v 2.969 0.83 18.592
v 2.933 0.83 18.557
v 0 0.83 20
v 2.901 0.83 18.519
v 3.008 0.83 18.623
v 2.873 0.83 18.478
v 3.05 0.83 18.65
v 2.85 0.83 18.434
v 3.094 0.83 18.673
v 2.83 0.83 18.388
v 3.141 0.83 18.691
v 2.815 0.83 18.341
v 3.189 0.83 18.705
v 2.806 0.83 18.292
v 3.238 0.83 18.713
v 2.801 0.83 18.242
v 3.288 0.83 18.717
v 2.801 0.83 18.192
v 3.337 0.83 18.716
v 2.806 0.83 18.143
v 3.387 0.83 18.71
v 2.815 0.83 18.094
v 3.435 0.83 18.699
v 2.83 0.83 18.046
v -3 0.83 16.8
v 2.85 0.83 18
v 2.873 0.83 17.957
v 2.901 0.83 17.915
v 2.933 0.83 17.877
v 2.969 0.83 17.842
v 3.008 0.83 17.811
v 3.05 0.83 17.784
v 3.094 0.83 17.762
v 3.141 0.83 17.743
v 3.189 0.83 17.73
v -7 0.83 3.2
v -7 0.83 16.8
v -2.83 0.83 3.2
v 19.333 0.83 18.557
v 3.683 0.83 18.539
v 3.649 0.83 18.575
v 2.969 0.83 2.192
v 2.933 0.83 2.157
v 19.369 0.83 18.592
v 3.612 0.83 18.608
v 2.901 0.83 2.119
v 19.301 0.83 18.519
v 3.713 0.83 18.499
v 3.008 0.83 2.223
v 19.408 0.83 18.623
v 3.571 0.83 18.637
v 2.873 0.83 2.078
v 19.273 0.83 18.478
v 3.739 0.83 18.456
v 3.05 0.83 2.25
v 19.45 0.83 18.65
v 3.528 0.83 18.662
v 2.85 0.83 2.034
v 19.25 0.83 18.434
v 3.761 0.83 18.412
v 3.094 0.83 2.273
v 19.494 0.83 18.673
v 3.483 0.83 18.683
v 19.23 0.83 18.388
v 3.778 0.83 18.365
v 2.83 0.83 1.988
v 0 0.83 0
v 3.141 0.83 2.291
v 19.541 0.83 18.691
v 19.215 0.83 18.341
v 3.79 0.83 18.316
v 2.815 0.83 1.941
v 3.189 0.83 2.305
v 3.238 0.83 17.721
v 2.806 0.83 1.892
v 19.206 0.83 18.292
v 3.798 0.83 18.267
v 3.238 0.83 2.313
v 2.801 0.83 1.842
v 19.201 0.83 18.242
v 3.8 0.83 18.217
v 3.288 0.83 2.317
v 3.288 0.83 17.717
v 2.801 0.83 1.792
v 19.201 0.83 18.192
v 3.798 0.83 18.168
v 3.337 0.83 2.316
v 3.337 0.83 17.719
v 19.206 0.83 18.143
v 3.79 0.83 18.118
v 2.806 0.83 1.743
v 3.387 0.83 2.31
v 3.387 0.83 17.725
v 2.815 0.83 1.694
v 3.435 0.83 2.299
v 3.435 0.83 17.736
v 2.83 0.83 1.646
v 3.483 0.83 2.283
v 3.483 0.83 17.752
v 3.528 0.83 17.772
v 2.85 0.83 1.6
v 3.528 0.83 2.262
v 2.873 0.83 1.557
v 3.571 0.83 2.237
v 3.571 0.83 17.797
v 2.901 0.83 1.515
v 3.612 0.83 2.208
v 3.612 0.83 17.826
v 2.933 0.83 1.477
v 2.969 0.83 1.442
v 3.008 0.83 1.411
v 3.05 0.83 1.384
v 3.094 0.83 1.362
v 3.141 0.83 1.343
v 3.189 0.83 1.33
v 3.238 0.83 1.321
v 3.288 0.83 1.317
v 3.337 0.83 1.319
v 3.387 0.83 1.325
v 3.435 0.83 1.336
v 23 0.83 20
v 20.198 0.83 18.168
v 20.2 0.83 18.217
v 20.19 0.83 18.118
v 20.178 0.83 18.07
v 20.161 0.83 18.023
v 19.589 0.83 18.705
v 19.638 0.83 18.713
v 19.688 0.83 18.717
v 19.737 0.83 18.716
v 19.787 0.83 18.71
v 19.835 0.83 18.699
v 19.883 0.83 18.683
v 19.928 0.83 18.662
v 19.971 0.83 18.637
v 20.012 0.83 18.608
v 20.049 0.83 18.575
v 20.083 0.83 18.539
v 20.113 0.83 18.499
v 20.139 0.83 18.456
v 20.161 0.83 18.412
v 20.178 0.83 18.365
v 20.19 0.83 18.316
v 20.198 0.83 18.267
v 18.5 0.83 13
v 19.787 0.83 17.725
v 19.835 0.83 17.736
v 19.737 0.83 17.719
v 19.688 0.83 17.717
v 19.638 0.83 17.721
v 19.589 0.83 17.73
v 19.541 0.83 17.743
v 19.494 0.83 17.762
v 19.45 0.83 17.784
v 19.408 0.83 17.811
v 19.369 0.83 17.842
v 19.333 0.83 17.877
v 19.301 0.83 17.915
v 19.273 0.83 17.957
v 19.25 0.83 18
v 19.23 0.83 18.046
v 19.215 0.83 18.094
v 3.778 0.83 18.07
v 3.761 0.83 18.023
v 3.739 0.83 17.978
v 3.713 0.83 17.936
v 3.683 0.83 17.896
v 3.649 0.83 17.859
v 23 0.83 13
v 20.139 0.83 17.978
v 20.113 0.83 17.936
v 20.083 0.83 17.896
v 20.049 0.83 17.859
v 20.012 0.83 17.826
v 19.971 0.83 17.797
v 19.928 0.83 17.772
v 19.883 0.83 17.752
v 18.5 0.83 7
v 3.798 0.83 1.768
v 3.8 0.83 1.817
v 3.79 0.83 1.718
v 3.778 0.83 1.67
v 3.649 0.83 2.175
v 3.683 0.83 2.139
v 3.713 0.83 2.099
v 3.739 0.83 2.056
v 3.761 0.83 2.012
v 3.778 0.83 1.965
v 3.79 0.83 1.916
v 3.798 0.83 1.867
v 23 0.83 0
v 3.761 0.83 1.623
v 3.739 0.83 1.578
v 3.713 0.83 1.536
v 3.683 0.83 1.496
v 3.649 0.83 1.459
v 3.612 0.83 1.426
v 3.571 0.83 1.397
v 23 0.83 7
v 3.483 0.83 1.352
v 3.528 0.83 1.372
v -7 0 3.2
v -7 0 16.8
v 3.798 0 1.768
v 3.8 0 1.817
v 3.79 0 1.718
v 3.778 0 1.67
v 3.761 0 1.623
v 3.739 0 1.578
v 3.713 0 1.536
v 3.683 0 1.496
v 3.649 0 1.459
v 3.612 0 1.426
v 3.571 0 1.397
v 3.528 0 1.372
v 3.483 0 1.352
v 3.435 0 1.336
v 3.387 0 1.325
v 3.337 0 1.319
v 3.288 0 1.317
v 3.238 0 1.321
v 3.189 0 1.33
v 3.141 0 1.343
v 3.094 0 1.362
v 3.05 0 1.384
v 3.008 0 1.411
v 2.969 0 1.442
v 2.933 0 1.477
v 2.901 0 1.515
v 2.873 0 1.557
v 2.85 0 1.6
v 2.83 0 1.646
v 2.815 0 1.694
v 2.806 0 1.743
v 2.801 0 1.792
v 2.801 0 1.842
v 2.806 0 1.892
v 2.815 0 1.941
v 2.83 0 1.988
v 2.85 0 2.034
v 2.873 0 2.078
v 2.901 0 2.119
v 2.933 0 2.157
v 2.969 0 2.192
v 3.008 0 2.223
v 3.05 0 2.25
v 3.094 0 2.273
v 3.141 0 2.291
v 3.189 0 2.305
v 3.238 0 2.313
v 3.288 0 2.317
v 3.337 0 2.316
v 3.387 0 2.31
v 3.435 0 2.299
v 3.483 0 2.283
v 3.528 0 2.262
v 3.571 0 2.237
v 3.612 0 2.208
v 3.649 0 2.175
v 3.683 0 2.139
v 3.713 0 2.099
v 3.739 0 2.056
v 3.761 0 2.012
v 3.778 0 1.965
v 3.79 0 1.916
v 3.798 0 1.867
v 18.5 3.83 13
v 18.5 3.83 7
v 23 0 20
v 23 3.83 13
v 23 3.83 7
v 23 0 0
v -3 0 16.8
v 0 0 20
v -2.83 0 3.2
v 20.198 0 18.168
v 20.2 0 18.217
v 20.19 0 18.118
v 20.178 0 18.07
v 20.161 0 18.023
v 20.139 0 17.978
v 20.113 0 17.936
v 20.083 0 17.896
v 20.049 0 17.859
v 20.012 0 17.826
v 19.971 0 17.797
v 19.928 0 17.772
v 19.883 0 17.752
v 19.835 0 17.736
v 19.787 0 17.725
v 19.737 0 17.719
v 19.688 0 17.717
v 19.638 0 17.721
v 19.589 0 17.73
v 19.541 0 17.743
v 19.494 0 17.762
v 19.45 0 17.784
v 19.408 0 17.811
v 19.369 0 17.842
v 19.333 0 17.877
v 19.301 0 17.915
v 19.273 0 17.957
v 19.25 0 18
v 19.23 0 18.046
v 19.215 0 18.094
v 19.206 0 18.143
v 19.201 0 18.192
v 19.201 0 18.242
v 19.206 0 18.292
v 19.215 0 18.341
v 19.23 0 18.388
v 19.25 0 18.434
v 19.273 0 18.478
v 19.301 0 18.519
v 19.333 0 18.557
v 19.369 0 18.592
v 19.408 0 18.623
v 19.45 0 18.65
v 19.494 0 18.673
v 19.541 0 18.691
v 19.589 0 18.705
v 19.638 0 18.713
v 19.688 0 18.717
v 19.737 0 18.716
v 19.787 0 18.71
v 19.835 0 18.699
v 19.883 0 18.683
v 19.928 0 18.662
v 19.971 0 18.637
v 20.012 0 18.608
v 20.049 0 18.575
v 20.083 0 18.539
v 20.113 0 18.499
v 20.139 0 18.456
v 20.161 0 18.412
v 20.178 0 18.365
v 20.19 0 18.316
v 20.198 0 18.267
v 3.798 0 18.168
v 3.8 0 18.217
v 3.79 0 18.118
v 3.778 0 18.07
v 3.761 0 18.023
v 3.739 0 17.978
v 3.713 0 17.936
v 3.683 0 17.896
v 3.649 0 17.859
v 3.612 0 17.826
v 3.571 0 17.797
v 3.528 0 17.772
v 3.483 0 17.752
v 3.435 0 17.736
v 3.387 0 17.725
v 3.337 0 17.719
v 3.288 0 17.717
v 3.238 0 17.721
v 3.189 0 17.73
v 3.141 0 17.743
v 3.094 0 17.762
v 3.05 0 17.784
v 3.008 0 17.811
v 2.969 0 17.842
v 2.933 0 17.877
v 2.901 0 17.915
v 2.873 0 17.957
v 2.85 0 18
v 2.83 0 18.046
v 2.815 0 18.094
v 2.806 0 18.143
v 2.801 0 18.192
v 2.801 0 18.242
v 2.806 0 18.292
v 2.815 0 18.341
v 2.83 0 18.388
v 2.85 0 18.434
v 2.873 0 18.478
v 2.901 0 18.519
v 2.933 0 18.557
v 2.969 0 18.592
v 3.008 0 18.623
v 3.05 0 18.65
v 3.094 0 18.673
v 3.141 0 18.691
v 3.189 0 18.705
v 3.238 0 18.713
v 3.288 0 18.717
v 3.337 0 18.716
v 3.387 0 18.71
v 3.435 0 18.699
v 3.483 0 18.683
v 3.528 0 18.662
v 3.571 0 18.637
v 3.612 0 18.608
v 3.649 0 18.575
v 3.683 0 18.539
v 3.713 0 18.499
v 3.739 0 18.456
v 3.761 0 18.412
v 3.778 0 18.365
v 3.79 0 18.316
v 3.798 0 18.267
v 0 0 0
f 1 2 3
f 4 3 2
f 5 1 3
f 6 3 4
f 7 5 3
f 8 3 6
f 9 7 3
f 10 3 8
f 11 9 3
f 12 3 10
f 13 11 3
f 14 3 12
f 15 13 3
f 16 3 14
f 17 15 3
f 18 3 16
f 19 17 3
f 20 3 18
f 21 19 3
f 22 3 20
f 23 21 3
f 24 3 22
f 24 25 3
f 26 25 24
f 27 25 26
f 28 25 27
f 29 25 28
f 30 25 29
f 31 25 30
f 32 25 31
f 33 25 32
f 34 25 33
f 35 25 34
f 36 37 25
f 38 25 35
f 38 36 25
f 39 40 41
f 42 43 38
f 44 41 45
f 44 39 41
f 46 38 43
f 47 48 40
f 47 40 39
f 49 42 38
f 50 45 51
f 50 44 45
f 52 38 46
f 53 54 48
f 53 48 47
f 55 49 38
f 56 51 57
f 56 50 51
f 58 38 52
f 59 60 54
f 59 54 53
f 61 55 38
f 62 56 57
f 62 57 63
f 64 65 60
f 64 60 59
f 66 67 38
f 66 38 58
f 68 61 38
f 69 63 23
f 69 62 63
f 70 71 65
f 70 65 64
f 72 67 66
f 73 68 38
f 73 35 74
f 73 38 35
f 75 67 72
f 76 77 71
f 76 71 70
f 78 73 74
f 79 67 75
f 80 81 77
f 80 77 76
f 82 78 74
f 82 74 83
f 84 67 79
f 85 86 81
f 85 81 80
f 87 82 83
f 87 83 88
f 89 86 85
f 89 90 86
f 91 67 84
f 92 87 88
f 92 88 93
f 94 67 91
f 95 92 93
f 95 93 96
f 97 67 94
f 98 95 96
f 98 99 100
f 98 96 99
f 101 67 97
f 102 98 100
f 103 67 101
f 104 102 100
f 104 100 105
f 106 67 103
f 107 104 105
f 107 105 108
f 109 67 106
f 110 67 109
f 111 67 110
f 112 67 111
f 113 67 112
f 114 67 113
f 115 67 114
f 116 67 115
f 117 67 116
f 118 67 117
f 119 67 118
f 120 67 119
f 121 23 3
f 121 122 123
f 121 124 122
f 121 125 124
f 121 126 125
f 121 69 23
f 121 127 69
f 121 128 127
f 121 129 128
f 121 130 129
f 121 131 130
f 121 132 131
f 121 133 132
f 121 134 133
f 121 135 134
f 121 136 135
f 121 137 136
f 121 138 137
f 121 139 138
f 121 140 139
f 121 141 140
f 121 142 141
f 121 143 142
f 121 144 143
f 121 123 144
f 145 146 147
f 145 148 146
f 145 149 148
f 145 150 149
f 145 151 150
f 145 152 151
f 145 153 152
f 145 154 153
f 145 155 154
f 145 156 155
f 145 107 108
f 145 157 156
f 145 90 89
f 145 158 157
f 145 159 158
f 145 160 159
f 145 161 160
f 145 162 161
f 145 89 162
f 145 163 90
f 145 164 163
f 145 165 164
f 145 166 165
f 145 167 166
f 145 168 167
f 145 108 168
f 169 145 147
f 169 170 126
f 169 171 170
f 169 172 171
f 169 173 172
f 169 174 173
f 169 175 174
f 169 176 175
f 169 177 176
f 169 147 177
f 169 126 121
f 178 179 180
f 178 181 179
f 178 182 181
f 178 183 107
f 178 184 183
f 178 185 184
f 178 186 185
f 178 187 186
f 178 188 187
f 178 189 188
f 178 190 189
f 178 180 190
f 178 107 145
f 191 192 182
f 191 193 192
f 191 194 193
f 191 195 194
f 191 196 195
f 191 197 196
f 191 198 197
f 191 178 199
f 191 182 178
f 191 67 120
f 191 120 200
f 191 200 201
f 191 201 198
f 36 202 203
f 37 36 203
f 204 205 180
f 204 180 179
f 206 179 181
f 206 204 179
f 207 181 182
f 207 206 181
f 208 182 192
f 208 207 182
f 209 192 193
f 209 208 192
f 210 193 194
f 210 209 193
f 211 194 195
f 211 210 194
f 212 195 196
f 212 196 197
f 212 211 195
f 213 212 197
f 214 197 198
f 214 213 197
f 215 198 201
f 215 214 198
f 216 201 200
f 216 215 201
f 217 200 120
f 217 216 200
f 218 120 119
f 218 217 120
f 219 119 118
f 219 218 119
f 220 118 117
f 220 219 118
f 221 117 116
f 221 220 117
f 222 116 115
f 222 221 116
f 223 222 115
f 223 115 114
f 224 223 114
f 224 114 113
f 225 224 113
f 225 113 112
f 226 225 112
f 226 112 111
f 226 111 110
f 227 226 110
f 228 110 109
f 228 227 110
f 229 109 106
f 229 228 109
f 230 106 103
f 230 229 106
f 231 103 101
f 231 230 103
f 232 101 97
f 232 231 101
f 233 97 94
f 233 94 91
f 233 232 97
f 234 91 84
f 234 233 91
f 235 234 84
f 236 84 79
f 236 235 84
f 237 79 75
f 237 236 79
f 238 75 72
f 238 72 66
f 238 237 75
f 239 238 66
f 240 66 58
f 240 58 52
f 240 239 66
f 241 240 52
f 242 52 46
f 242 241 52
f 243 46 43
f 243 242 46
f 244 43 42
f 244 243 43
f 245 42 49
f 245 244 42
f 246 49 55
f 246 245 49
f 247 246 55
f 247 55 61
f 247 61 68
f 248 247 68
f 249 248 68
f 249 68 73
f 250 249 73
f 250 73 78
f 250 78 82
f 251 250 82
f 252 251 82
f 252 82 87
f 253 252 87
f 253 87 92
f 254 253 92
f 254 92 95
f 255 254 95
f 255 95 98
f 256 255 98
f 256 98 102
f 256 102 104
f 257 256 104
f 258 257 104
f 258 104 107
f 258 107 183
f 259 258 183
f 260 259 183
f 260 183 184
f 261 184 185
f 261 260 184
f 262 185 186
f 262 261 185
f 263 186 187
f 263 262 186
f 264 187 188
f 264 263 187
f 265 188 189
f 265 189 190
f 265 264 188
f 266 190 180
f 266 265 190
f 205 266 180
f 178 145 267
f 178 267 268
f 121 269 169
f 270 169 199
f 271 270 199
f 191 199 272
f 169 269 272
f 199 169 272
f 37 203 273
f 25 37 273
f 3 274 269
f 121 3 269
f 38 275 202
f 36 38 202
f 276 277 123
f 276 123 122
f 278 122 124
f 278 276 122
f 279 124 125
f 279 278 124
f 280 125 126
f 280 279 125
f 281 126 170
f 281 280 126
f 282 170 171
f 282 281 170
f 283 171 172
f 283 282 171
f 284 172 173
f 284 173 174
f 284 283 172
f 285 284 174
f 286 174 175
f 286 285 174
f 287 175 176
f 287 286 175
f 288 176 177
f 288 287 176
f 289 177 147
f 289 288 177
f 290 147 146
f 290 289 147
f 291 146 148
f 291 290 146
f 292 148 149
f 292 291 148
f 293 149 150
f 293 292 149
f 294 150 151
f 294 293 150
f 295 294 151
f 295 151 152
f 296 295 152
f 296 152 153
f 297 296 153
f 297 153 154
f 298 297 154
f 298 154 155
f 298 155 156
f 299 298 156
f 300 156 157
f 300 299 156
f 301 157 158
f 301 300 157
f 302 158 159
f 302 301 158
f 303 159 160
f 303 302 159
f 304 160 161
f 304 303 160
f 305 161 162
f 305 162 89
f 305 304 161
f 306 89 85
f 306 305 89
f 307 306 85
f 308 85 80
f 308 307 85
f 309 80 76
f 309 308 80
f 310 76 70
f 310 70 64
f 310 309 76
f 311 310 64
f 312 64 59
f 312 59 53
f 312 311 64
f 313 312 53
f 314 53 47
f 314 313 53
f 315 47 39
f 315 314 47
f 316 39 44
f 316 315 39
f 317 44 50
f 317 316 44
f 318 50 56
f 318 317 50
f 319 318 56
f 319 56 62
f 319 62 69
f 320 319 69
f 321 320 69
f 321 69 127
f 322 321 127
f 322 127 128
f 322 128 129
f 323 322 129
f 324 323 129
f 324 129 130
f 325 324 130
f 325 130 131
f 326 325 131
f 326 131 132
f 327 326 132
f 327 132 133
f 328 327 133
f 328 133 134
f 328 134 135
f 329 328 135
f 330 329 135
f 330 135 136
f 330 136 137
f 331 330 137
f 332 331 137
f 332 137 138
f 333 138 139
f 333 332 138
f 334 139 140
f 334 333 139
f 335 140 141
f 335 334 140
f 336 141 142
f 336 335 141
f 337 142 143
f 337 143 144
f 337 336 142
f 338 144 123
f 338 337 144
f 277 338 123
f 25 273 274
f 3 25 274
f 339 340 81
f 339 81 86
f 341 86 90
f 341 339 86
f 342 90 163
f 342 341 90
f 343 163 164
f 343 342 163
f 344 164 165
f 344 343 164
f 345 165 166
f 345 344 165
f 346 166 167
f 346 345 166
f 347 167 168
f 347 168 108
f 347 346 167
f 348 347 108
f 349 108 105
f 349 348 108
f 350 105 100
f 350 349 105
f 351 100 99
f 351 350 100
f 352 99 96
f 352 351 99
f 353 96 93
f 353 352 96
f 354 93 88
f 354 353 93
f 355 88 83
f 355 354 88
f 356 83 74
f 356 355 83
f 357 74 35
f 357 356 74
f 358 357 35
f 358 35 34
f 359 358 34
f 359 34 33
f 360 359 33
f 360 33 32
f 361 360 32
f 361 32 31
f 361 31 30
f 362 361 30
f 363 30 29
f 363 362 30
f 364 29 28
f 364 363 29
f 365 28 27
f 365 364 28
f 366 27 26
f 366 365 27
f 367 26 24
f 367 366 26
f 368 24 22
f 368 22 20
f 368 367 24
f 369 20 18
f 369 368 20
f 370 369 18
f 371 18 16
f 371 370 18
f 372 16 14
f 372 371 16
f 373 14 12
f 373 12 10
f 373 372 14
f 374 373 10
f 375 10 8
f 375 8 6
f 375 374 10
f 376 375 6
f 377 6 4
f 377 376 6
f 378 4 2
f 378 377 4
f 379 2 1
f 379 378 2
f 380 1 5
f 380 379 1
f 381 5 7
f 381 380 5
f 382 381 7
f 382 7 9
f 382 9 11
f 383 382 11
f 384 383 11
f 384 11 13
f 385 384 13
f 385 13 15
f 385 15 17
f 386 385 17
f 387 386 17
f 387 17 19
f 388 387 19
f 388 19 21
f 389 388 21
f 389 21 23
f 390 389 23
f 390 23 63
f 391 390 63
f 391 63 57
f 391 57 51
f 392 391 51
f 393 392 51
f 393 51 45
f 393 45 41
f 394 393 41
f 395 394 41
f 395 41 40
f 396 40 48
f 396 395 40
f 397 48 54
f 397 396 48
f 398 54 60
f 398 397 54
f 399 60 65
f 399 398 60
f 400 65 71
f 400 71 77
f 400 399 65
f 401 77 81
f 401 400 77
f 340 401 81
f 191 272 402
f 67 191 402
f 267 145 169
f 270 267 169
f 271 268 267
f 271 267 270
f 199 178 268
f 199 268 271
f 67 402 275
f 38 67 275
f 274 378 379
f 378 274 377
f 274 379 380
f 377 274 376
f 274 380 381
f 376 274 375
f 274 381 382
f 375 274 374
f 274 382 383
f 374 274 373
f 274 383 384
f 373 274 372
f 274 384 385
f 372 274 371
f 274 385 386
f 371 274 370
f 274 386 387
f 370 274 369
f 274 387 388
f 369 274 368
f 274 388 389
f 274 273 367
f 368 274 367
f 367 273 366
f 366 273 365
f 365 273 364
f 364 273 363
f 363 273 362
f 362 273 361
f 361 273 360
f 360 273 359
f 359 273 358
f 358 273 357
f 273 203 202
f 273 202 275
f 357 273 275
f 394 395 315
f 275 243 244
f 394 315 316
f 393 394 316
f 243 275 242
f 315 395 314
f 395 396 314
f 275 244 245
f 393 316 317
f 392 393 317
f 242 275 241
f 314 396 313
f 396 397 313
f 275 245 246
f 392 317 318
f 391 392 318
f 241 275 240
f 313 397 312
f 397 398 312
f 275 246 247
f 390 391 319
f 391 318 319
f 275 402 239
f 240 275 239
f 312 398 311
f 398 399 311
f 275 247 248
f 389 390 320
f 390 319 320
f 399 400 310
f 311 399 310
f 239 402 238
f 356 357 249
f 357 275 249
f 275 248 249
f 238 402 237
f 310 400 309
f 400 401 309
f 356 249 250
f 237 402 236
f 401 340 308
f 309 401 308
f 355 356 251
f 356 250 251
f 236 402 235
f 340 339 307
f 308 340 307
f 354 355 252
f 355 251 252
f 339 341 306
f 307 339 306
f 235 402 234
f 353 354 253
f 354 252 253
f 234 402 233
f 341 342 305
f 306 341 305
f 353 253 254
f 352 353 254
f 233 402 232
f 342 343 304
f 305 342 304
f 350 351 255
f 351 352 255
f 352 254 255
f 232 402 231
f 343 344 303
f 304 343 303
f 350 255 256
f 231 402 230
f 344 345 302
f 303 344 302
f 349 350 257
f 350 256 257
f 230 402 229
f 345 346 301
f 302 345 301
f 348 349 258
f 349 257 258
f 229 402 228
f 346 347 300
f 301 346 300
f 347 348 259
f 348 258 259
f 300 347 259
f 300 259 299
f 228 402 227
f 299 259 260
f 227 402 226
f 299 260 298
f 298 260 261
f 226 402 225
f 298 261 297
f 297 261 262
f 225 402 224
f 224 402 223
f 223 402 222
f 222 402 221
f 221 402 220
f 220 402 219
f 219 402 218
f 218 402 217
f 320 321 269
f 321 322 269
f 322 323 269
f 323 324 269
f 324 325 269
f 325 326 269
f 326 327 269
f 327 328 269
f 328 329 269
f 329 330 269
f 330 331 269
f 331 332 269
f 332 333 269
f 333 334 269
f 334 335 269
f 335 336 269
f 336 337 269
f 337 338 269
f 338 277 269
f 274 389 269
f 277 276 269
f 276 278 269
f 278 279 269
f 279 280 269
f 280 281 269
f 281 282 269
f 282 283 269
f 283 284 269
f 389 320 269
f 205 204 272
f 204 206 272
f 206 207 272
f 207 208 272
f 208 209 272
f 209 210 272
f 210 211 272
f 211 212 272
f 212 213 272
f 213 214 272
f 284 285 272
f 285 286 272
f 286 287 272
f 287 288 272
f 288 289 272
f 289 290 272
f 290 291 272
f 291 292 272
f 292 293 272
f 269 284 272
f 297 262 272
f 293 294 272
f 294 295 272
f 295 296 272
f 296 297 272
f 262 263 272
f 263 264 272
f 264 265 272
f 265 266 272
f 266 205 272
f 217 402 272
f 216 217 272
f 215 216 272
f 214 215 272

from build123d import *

# Parameters (mm, degrees)
SKETCH1_R           = 0.5
BOSS_EXTRUDE1_DEPTH = 0.83
SKETCH2_W           = 4.5
SKETCH2_H           = 6
BOSS_EXTRUDE2_DEPTH = 3


with BuildPart() as part:
    # Sketch1 → Boss-Extrude1 (new body)
    with BuildSketch(Plane(origin=(0, 0, 0), x_dir=(1, 0, 0), z_dir=(0, 1, 0))):
        Polygon((0, 0), (-2.83, -3.2), (-7, -3.2), (-7, -16.8), (-3, -16.8), (0, -20), (23, -20), (23, 0), align=None)
        with Locations((3.3, -18.217292277)):
            Circle(SKETCH1_R, mode=Mode.SUBTRACT)
        with Locations((3.3, -1.817292277)):
            Circle(SKETCH1_R, mode=Mode.SUBTRACT)
        with Locations((19.7, -18.217292277)):
            Circle(SKETCH1_R, mode=Mode.SUBTRACT)
    extrude(amount=BOSS_EXTRUDE1_DEPTH)

    # Sketch2 → Boss-Extrude2 (add)
    with BuildSketch(Plane(origin=(0, 0.83, 0), x_dir=(1, 0, 0), z_dir=(0, 1, 0))):
        with Locations((20.75, -10)):
            Rectangle(SKETCH2_W, SKETCH2_H)
    extrude(amount=BOSS_EXTRUDE2_DEPTH)


solid = part.part
